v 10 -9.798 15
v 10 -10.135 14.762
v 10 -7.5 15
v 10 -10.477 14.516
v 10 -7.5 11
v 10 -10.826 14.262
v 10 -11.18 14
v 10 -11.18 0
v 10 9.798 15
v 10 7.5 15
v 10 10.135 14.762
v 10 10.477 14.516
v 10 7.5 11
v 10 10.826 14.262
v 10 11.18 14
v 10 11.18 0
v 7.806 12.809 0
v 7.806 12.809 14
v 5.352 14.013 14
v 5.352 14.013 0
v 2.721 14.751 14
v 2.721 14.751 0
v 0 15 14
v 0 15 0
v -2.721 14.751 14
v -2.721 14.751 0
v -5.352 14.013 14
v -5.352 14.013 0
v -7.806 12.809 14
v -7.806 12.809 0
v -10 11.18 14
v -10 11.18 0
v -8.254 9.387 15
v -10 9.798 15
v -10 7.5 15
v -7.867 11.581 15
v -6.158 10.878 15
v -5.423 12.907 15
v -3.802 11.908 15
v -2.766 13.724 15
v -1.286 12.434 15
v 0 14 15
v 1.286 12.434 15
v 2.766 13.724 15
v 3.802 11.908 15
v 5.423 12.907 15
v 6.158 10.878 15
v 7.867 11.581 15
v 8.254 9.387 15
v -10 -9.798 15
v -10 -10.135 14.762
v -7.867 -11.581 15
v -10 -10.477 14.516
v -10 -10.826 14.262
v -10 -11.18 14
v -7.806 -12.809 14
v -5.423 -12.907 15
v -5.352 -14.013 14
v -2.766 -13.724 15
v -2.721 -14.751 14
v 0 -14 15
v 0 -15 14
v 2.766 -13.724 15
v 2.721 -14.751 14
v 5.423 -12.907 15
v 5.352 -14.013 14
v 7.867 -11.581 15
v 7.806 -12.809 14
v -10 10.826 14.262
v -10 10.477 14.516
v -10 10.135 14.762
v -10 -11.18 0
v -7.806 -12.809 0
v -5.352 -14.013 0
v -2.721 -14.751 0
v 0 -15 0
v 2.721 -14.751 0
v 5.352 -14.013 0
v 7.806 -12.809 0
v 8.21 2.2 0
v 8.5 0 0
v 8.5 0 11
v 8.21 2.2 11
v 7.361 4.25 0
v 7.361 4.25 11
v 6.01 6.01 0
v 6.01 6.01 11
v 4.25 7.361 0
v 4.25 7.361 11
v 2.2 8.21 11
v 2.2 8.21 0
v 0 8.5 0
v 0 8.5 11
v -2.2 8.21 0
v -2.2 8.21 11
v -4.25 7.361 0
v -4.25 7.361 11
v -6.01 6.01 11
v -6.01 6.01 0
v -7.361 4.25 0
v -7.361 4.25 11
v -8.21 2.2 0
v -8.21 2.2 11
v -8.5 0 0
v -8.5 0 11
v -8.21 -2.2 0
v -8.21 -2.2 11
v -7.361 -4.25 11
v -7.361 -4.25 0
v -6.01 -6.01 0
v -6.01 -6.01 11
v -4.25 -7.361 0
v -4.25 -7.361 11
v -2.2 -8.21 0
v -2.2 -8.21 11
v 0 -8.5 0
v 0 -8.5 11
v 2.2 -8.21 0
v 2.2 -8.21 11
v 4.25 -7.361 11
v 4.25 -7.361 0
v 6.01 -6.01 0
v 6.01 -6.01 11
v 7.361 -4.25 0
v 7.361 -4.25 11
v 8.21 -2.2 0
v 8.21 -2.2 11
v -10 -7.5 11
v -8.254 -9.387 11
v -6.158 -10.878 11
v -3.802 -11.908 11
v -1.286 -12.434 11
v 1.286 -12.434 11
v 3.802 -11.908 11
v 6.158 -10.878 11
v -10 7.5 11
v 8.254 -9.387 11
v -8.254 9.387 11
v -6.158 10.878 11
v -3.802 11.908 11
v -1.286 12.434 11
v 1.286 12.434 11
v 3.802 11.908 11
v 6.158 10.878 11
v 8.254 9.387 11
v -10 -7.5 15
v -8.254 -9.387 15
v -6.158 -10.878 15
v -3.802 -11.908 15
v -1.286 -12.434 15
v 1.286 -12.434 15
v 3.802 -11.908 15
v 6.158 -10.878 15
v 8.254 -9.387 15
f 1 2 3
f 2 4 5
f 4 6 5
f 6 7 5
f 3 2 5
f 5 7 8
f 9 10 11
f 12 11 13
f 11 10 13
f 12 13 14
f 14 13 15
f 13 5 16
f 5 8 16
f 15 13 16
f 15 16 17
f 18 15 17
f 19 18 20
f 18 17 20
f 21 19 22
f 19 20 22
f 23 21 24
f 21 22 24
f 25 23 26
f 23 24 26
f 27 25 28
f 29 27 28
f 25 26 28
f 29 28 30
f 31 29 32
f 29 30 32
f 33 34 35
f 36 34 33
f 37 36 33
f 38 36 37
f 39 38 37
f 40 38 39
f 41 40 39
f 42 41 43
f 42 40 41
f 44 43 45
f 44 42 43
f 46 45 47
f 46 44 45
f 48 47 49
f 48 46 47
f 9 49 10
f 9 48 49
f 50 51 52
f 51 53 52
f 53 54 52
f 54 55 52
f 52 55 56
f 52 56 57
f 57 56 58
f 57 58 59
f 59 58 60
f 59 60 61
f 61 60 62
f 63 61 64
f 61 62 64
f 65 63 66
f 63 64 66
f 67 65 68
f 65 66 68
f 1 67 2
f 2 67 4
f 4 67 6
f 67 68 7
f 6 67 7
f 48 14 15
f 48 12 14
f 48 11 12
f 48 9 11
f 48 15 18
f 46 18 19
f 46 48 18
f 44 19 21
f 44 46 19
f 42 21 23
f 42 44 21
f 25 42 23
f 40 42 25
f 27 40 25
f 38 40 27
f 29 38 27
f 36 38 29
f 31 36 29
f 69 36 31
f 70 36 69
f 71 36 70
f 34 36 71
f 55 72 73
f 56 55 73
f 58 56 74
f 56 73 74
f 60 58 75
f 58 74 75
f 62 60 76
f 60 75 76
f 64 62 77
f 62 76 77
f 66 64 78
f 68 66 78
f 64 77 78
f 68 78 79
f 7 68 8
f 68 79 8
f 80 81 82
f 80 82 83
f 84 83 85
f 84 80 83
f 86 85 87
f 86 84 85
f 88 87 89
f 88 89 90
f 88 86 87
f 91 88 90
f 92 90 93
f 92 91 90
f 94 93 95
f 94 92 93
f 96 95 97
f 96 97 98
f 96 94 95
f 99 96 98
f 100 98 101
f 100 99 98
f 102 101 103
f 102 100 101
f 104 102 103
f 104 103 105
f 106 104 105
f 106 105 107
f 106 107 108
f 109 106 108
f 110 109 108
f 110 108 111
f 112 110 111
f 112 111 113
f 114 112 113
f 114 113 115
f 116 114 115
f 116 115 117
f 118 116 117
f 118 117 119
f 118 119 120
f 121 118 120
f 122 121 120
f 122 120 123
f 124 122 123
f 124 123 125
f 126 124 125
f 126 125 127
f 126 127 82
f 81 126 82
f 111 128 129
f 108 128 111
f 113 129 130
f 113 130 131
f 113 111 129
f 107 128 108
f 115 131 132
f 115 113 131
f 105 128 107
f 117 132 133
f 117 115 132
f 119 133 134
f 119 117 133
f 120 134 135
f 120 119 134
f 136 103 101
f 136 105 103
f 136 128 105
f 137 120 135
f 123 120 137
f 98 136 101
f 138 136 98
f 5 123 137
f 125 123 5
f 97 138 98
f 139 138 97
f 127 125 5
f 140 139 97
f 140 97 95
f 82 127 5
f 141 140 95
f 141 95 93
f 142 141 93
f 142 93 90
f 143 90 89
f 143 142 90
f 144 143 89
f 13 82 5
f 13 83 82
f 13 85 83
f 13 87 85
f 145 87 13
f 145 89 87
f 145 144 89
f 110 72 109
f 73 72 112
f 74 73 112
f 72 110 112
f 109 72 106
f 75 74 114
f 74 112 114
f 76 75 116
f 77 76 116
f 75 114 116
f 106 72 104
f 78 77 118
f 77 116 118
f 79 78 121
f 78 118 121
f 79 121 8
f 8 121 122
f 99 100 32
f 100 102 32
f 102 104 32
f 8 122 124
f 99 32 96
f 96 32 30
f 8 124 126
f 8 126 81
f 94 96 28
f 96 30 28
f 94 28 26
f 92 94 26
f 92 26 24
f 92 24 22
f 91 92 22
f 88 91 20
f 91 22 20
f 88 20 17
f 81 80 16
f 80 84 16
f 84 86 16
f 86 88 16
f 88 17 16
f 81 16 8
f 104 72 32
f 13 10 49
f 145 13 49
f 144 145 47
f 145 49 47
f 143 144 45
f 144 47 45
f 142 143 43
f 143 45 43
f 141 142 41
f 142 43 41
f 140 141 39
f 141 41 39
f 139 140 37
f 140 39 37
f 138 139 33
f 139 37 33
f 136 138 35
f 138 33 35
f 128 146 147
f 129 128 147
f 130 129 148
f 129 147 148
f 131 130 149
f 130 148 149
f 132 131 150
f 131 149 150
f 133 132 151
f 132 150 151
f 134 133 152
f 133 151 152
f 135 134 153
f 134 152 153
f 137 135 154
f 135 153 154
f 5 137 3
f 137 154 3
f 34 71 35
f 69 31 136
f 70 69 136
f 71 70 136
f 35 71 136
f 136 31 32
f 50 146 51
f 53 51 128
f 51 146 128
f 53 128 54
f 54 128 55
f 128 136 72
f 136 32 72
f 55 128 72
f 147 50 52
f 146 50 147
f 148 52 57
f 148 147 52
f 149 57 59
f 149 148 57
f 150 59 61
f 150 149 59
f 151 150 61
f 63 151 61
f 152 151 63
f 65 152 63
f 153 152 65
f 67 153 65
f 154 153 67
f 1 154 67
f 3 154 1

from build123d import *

# Parameters (mm, degrees)
F0_R     = 8.5
F1_DEPTH = 15
F2_R     = 8.5
F3_DEPTH = 4
F4_SIZE  = 1


with BuildPart() as f1:
    # F0 (on Top) → F1 (new body)
    with BuildSketch(Plane.XY):
        with BuildLine():
            Line((10, -11.1803398875), (10, 11.1803398875))
            ThreePointArc((10, 11.1803398875), (0, 15), (-10, 11.1803398875))
            Line((-10, 11.1803398875), (-10, -11.1803398875))
            ThreePointArc((-10, -11.1803398875), (0, -15), (10, -11.1803398875))
        make_face()
        Circle(F0_R, mode=Mode.SUBTRACT)
    extrude(amount=F1_DEPTH)

    # F2 (on face) → F3 (cut)
    with BuildSketch(Plane.XY.offset(15)):
        with BuildLine():
            Line((10, -7.5), (10, 7.5))
            ThreePointArc((10, 7.5), (0, 12.5), (-10, 7.5))
            Line((-10, 7.5), (-10, -7.5))
            ThreePointArc((-10, -7.5), (0, -12.5), (10, -7.5))
        make_face()
        Circle(F2_R, mode=Mode.SUBTRACT)
    extrude(amount=-F3_DEPTH, mode=Mode.SUBTRACT)

    # F4
    f4_edges = [f1.edges().sort_by_distance(p)[0] for p in [
        (0, -15, 15),
        (0, 15, 15),
    ]]
    chamfer(f4_edges, length=F4_SIZE)


solid = f1.part
